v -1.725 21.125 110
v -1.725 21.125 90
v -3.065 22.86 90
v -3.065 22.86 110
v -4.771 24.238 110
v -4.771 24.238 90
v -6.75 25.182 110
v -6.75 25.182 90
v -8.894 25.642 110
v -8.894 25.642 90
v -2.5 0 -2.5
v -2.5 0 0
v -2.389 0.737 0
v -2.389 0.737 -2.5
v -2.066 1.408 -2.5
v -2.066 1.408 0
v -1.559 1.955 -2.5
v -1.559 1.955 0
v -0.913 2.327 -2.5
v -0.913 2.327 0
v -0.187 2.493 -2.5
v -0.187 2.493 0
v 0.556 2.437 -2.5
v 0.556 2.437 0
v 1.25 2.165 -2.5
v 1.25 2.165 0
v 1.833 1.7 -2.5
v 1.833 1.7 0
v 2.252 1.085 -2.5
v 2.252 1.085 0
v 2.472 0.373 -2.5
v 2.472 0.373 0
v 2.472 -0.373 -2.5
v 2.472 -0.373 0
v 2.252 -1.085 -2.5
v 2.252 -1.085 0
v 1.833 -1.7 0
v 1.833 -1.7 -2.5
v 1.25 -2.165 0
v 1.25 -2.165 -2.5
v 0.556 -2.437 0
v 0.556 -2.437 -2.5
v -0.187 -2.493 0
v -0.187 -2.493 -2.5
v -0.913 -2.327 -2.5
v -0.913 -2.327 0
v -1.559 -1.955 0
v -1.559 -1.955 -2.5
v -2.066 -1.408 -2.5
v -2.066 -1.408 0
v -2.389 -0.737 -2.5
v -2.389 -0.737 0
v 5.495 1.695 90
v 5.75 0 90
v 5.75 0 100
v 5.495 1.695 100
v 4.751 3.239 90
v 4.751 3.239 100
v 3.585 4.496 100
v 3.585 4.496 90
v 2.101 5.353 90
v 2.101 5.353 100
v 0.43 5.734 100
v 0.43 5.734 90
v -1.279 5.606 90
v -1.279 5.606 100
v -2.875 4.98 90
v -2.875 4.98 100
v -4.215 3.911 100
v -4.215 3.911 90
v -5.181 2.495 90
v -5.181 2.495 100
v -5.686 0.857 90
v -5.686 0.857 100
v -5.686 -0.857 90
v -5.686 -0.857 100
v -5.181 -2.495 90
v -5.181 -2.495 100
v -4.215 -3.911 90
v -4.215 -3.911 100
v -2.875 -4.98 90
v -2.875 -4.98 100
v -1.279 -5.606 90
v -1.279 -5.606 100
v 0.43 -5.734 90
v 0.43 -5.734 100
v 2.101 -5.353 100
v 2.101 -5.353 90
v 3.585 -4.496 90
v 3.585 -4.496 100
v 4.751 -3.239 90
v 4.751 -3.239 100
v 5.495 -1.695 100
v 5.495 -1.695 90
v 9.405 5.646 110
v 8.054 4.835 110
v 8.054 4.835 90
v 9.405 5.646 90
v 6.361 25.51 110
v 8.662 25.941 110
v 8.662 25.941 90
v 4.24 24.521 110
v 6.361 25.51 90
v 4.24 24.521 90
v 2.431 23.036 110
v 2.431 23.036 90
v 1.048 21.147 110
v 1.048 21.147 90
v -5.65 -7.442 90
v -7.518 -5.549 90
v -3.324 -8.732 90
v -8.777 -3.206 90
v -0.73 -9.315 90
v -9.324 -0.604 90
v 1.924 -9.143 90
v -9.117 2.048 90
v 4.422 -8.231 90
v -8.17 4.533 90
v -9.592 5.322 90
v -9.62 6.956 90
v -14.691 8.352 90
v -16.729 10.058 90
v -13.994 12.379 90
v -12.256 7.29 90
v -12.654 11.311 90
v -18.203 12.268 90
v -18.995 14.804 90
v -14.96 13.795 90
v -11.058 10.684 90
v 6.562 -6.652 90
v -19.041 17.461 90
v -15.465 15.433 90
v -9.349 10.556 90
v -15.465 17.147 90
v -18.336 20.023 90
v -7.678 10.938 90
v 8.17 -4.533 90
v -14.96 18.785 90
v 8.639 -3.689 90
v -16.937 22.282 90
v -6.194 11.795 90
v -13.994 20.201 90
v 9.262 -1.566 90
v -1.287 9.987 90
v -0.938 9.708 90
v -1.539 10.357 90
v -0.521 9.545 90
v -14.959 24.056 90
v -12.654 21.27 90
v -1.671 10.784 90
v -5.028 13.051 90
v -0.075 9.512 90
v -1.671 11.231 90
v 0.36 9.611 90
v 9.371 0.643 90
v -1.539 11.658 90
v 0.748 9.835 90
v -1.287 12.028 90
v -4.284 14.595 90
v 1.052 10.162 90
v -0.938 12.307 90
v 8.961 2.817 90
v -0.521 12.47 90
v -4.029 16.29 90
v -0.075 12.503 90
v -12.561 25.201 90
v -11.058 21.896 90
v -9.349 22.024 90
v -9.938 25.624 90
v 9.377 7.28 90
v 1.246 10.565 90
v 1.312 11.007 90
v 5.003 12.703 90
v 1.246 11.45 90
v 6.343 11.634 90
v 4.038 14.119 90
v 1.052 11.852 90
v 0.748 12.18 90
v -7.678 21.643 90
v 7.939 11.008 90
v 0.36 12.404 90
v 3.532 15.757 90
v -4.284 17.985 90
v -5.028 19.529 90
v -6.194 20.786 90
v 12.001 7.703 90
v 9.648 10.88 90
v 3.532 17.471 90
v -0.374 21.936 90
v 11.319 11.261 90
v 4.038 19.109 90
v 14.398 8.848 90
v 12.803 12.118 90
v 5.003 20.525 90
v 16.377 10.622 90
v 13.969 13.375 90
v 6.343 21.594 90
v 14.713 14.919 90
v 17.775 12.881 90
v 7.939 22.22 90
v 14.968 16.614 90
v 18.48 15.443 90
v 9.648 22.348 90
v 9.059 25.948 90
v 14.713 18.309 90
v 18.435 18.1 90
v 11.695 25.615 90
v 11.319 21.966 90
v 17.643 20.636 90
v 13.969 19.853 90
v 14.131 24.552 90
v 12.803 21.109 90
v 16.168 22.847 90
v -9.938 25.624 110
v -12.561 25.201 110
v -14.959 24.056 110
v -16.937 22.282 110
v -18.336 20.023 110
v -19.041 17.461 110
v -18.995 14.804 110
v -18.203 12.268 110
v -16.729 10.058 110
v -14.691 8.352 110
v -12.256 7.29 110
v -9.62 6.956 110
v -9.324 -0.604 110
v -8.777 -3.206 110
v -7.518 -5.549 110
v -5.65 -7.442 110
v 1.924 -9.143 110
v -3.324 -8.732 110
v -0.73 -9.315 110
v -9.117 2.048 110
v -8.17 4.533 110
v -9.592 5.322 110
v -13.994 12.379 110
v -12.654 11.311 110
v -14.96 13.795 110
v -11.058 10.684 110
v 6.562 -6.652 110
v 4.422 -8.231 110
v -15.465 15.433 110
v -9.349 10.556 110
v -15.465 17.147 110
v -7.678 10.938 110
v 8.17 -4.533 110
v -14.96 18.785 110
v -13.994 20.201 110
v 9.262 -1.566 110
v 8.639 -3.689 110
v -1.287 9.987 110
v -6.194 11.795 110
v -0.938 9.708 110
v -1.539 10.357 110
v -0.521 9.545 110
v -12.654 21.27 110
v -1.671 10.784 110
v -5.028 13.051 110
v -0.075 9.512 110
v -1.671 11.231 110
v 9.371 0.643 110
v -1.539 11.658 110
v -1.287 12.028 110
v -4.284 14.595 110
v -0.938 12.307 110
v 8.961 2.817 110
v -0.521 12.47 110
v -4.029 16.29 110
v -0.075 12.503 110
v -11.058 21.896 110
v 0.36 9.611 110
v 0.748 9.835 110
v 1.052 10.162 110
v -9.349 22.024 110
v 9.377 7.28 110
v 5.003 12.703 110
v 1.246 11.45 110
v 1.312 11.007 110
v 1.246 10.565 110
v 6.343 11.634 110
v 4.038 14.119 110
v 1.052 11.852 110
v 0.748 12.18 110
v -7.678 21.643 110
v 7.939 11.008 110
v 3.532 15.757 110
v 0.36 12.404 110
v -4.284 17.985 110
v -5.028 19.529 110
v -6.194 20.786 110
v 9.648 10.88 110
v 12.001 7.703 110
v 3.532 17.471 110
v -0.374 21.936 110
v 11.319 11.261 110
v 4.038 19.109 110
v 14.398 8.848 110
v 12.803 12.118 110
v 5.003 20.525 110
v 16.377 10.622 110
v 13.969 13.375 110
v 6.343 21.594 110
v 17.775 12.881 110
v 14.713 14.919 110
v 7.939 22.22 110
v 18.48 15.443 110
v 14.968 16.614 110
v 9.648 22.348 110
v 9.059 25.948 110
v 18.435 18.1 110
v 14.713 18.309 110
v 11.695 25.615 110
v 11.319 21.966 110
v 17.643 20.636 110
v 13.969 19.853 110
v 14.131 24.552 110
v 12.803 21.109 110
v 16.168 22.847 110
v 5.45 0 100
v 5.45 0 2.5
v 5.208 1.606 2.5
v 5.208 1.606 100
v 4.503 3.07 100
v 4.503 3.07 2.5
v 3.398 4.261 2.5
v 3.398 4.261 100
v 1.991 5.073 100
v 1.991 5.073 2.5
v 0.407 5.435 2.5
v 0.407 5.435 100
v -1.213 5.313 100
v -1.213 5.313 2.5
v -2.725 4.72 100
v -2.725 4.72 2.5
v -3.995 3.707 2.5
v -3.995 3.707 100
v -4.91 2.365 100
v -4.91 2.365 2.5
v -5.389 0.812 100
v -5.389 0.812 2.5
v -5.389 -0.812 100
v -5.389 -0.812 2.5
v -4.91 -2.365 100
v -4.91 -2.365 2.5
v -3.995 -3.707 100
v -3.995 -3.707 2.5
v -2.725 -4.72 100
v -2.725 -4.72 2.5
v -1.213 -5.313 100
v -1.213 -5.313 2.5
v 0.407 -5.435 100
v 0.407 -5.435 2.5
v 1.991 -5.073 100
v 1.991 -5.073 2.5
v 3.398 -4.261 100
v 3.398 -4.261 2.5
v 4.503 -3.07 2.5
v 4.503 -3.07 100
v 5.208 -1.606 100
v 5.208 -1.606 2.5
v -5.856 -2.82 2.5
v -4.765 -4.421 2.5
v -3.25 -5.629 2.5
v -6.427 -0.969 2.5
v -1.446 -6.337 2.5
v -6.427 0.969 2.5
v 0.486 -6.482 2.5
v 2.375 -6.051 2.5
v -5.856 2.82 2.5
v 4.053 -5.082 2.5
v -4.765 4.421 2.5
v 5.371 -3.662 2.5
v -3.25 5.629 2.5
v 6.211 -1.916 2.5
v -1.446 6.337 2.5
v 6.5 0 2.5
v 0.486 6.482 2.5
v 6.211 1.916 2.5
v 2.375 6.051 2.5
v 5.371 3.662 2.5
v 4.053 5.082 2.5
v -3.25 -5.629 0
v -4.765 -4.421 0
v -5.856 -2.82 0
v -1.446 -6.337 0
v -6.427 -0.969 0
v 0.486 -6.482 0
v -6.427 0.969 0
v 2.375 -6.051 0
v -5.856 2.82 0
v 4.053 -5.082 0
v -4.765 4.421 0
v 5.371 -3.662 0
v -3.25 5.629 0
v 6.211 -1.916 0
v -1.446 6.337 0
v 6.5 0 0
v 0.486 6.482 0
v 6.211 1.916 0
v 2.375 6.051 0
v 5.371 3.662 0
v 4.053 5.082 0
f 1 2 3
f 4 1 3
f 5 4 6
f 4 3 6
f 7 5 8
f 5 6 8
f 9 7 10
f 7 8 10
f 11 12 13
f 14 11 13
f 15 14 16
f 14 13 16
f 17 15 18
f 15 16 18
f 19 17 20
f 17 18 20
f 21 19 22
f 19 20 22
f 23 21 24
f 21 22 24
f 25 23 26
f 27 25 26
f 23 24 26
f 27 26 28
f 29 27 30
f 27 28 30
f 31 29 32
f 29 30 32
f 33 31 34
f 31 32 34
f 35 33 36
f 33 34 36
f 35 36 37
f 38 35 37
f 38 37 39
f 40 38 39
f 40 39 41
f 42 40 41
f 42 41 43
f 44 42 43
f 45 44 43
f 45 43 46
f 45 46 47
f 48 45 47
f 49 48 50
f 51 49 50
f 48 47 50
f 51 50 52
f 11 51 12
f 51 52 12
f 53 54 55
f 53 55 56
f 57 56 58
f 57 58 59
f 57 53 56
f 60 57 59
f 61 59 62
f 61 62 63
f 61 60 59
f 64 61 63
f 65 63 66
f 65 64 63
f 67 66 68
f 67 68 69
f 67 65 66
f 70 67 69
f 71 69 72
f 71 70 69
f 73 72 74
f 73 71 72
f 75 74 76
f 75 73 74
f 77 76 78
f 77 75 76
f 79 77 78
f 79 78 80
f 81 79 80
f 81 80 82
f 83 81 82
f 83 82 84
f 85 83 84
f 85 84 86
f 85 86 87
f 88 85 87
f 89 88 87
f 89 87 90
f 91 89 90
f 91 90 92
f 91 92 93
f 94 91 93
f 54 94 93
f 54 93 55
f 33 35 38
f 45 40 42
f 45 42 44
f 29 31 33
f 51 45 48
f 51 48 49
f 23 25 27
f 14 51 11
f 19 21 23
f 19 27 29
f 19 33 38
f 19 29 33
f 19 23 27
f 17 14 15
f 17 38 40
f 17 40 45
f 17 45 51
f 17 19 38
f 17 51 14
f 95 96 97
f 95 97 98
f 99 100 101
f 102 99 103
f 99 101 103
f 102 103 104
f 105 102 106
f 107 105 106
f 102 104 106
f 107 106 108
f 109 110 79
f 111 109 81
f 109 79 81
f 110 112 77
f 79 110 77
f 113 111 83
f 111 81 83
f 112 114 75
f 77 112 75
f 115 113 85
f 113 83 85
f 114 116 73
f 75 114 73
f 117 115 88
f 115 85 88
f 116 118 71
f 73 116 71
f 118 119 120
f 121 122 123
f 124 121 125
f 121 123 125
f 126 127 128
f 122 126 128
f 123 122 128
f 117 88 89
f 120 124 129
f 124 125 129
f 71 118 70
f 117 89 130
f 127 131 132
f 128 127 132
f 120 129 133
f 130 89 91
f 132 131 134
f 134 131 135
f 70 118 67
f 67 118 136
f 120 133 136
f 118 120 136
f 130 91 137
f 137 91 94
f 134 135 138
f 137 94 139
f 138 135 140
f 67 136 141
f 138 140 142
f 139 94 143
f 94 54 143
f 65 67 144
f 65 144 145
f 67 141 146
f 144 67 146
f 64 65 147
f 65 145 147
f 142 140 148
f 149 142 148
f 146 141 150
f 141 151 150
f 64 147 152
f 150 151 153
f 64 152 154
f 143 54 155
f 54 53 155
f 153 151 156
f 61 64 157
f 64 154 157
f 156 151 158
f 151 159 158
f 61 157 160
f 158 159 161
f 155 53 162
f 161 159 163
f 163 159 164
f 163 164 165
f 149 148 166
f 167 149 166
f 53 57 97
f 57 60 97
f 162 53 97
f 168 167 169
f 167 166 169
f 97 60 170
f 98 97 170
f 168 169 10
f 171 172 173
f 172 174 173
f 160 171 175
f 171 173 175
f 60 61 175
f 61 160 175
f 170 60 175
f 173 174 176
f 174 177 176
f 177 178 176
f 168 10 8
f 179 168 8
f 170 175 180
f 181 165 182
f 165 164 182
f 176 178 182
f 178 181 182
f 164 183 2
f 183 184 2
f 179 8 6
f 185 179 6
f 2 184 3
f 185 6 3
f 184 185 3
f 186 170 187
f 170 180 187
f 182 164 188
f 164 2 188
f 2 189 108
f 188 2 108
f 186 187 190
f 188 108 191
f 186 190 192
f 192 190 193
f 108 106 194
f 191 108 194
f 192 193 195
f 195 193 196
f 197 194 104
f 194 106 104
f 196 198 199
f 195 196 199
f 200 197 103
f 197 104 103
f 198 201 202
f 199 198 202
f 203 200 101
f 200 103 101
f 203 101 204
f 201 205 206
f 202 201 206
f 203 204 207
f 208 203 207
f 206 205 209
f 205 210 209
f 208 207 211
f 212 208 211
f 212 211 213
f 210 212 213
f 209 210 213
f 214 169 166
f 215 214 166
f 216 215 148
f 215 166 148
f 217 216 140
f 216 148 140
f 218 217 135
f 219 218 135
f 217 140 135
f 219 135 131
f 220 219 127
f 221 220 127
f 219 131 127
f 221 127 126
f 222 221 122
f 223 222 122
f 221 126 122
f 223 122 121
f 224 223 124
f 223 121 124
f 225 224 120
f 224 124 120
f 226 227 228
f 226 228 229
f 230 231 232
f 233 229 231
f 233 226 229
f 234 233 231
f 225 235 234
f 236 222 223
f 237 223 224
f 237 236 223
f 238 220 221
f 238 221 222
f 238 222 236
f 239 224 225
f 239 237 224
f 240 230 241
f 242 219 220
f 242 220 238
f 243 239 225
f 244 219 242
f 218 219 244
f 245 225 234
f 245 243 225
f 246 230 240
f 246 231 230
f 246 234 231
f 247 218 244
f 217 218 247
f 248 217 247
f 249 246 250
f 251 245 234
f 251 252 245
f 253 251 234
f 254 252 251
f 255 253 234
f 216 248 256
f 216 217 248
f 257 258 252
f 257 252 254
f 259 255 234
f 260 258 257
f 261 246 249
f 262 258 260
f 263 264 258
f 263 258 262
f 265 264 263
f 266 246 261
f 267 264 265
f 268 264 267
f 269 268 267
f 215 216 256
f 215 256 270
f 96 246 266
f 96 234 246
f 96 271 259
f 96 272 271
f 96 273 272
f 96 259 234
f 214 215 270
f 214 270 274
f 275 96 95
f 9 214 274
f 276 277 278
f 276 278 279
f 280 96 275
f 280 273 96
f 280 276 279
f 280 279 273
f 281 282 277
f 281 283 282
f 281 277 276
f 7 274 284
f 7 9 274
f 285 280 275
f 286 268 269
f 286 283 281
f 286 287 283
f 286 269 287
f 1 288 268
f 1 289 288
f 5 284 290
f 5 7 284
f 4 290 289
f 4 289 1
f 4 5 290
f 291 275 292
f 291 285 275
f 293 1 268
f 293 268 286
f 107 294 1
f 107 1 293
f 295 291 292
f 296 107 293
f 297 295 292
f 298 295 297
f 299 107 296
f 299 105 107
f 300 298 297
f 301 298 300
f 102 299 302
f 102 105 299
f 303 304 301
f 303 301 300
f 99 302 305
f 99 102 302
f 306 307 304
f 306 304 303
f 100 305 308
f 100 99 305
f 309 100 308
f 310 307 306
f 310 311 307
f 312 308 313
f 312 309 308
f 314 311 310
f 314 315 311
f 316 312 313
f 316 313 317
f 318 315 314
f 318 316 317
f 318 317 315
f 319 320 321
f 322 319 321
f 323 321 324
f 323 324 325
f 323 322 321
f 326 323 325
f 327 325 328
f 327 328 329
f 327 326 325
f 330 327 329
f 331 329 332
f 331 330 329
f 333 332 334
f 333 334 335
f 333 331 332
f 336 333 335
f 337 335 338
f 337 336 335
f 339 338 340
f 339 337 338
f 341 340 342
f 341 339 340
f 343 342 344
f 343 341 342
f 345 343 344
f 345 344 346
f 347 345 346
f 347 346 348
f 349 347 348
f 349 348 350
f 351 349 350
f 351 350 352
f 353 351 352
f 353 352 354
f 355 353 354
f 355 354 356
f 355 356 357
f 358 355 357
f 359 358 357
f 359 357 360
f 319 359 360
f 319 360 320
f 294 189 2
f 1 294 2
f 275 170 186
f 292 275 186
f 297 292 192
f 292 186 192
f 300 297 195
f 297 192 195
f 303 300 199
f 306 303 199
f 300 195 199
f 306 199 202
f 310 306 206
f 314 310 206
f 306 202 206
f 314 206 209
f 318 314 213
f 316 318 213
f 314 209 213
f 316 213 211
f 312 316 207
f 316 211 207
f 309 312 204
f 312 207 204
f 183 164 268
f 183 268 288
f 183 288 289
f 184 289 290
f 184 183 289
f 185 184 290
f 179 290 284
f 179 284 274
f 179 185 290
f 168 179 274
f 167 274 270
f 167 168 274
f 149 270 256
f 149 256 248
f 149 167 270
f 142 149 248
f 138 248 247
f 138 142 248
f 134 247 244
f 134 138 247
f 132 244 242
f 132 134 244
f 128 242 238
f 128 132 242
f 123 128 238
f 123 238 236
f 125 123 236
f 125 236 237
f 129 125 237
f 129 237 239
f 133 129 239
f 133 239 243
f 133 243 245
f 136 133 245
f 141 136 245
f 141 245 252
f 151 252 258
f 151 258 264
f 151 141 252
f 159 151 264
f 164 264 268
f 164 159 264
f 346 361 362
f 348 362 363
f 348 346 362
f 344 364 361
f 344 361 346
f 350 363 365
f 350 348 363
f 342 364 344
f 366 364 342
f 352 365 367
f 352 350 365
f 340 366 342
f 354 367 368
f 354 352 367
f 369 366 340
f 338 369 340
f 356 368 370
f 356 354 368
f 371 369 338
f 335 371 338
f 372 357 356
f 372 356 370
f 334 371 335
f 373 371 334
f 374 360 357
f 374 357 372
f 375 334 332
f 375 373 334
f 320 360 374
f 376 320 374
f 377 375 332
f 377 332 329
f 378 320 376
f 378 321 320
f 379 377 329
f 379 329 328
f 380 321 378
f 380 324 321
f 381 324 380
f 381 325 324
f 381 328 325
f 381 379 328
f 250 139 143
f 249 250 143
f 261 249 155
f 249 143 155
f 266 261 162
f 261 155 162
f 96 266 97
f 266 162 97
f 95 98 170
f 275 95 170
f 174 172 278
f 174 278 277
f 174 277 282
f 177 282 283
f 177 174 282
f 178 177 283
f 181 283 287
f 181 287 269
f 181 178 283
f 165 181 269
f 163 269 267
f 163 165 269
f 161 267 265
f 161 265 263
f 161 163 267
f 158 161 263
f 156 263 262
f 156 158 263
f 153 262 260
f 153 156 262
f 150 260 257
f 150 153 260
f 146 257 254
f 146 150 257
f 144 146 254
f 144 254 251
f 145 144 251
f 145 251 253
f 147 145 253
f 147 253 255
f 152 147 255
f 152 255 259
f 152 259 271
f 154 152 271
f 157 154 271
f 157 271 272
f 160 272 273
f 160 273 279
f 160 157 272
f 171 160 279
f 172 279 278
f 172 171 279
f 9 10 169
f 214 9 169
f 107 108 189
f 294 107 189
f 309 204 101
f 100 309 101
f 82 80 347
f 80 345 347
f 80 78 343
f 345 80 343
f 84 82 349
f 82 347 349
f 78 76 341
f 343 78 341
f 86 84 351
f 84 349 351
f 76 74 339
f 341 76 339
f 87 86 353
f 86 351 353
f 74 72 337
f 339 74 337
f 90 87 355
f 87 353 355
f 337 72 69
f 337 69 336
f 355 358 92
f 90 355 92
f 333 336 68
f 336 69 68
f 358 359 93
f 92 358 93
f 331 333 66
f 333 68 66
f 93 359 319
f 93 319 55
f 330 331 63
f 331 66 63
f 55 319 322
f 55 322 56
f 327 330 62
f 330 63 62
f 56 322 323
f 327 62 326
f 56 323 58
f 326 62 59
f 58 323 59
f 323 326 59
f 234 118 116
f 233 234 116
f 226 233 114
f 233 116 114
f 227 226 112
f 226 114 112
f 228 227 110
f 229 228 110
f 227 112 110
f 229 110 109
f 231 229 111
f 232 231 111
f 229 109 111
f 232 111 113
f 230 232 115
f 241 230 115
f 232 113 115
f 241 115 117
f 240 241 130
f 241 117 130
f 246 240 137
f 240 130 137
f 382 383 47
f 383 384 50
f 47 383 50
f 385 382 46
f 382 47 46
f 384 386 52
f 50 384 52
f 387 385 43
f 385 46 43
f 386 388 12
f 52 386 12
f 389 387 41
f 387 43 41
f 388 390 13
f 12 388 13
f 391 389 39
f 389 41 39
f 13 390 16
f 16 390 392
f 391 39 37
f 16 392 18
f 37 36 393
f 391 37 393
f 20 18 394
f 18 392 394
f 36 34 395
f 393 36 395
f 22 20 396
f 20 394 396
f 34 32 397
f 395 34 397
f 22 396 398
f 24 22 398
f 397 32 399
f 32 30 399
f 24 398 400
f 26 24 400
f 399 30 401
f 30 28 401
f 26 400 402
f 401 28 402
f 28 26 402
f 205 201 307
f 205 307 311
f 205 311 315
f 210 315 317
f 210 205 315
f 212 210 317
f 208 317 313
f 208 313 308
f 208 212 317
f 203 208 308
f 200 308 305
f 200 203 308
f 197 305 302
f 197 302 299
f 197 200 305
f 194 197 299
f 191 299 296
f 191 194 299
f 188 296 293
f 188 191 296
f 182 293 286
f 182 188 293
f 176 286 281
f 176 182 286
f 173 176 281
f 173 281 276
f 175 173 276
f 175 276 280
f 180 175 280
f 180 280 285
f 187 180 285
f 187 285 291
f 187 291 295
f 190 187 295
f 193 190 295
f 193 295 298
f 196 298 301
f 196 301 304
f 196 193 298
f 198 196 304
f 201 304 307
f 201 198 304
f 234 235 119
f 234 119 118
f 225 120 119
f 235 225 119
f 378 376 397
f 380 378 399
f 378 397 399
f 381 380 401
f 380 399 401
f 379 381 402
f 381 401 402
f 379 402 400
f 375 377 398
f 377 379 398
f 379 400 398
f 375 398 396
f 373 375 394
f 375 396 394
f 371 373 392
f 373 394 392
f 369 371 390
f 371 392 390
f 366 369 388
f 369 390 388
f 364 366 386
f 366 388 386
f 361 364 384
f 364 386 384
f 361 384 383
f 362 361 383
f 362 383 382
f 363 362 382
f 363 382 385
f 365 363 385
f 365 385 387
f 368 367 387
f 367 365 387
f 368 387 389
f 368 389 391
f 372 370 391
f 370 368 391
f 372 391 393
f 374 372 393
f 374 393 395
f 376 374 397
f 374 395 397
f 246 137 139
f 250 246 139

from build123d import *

# Parameters (mm, degrees)
SKETCH1_R           = 6.5
BOSS_EXTRUDE1_DEPTH = 110
SKETCH6_R           = 2.5
BOSS_EXTRUDE2_DEPTH = 2.5
SKETCH7_R           = 2.65
CUT_EXTRUDE1_DEPTH  = 3
SKETCH9_OUTSIDE_W   = 37.798
SKETCH9_OUTSIDE_H   = 37.798
SKETCH9_OUTSIDE_R   = 5.45
CUT_EXTRUDE2_DEPTH  = 107.5
SKETCH10_R          = 5.75
BOSS_EXTRUDE3_DEPTH = 10
JOIN1_START         = 90
JOIN1_OUTLINE_R     = 5.75
JOIN1_OUTLINE_R_2   = 1.5
JOIN1_DEPTH         = 20


# Read off the part's stored shape, not the designer's step: Join1
with BuildPart() as part:
    # Sketch1 → Boss-Extrude1 (new body)
    with BuildSketch(Plane.XY):
        Circle(SKETCH1_R)
    extrude(amount=BOSS_EXTRUDE1_DEPTH)

    # Sketch6 → Boss-Extrude2 (add)
    with BuildSketch(Plane(origin=(0, 0, 0), x_dir=(-1, 0, 0), z_dir=(0, 0, -1))):
        Circle(SKETCH6_R)
    extrude(amount=BOSS_EXTRUDE2_DEPTH)

    # Sketch7 → Cut-Extrude1 (cut)
    with BuildSketch(Plane.XY.offset(110)):
        Circle(SKETCH7_R)
    extrude(amount=-CUT_EXTRUDE1_DEPTH, mode=Mode.SUBTRACT)

    # Sketch9 outside → Cut-Extrude2 (cut)
    with BuildSketch(Plane.XY.offset(110)):
        Rectangle(SKETCH9_OUTSIDE_W, SKETCH9_OUTSIDE_H)
        Circle(SKETCH9_OUTSIDE_R, mode=Mode.SUBTRACT)
    extrude(amount=-CUT_EXTRUDE2_DEPTH, mode=Mode.SUBTRACT)

    # Sketch10 → Boss-Extrude3 (add)
    with BuildSketch(Plane.XY.offset(110)):
        Circle(SKETCH10_R)
    extrude(amount=-BOSS_EXTRUDE3_DEPTH)

    # Join1 outline → Join1 (add)
    with BuildSketch(Plane.XY.offset(JOIN1_START)):
        with BuildLine():
            Line((-9.619925066, 6.956270405), (-9.592077276, 5.322159982))
            Line((-9.592077276, 5.322159982), (-8.170365761, 4.533323955))
            ThreePointArc((-8.170365761, 4.533323955), (-4.533323955, -8.170365761), (8.170365761, -4.533323955))
            Line((8.170365761, -4.533323955), (8.6389607, -3.688779845))
            ThreePointArc((8.6389607, -3.688779845), (9.371491926, 0.643333346), (8.053841212, 4.834705829))
            Line((8.053841212, 4.834705829), (9.405164385, 5.645902605))
            Line((9.405164385, 5.645902605), (9.377316595, 7.280013028))
            ThreePointArc((9.377316595, 7.280013028), (18.552203658, 16.773030292), (9.059186394, 25.947917355))
            Line((9.059186394, 25.947917355), (8.661829886, 25.941145781))
            ThreePointArc((8.661829886, 25.941145781), (4.239851168, 24.521014764), (1.047885733, 21.147289146))
            Line((1.047885733, 21.147289146), (-0.373825781, 21.936125173))
            Line((-0.373825781, 21.936125173), (-1.725148954, 21.124928398))
            ThreePointArc((-1.725148954, 21.124928398), (-4.771249912, 24.237629458), (-8.893805616, 25.641970375))
            Line((-8.893805616, 25.641970375), (-9.938055267, 25.624174732))
            ThreePointArc((-9.938055267, 25.624174732), (-19.11294233, 16.131157468), (-9.619925066, 6.956270405))
        make_face()
        Circle(JOIN1_OUTLINE_R, mode=Mode.SUBTRACT)
        with Locations((-9.778990166, 16.290222568)):
            Circle(JOIN1_OUTLINE_R, mode=Mode.SUBTRACT)
        with Locations((-0.187584514, 11.00747351)):
            Circle(JOIN1_OUTLINE_R_2, mode=Mode.SUBTRACT)
        with Locations((9.218251494, 16.613965192)):
            Circle(JOIN1_OUTLINE_R, mode=Mode.SUBTRACT)
    extrude(amount=JOIN1_DEPTH)


solid = part.part
